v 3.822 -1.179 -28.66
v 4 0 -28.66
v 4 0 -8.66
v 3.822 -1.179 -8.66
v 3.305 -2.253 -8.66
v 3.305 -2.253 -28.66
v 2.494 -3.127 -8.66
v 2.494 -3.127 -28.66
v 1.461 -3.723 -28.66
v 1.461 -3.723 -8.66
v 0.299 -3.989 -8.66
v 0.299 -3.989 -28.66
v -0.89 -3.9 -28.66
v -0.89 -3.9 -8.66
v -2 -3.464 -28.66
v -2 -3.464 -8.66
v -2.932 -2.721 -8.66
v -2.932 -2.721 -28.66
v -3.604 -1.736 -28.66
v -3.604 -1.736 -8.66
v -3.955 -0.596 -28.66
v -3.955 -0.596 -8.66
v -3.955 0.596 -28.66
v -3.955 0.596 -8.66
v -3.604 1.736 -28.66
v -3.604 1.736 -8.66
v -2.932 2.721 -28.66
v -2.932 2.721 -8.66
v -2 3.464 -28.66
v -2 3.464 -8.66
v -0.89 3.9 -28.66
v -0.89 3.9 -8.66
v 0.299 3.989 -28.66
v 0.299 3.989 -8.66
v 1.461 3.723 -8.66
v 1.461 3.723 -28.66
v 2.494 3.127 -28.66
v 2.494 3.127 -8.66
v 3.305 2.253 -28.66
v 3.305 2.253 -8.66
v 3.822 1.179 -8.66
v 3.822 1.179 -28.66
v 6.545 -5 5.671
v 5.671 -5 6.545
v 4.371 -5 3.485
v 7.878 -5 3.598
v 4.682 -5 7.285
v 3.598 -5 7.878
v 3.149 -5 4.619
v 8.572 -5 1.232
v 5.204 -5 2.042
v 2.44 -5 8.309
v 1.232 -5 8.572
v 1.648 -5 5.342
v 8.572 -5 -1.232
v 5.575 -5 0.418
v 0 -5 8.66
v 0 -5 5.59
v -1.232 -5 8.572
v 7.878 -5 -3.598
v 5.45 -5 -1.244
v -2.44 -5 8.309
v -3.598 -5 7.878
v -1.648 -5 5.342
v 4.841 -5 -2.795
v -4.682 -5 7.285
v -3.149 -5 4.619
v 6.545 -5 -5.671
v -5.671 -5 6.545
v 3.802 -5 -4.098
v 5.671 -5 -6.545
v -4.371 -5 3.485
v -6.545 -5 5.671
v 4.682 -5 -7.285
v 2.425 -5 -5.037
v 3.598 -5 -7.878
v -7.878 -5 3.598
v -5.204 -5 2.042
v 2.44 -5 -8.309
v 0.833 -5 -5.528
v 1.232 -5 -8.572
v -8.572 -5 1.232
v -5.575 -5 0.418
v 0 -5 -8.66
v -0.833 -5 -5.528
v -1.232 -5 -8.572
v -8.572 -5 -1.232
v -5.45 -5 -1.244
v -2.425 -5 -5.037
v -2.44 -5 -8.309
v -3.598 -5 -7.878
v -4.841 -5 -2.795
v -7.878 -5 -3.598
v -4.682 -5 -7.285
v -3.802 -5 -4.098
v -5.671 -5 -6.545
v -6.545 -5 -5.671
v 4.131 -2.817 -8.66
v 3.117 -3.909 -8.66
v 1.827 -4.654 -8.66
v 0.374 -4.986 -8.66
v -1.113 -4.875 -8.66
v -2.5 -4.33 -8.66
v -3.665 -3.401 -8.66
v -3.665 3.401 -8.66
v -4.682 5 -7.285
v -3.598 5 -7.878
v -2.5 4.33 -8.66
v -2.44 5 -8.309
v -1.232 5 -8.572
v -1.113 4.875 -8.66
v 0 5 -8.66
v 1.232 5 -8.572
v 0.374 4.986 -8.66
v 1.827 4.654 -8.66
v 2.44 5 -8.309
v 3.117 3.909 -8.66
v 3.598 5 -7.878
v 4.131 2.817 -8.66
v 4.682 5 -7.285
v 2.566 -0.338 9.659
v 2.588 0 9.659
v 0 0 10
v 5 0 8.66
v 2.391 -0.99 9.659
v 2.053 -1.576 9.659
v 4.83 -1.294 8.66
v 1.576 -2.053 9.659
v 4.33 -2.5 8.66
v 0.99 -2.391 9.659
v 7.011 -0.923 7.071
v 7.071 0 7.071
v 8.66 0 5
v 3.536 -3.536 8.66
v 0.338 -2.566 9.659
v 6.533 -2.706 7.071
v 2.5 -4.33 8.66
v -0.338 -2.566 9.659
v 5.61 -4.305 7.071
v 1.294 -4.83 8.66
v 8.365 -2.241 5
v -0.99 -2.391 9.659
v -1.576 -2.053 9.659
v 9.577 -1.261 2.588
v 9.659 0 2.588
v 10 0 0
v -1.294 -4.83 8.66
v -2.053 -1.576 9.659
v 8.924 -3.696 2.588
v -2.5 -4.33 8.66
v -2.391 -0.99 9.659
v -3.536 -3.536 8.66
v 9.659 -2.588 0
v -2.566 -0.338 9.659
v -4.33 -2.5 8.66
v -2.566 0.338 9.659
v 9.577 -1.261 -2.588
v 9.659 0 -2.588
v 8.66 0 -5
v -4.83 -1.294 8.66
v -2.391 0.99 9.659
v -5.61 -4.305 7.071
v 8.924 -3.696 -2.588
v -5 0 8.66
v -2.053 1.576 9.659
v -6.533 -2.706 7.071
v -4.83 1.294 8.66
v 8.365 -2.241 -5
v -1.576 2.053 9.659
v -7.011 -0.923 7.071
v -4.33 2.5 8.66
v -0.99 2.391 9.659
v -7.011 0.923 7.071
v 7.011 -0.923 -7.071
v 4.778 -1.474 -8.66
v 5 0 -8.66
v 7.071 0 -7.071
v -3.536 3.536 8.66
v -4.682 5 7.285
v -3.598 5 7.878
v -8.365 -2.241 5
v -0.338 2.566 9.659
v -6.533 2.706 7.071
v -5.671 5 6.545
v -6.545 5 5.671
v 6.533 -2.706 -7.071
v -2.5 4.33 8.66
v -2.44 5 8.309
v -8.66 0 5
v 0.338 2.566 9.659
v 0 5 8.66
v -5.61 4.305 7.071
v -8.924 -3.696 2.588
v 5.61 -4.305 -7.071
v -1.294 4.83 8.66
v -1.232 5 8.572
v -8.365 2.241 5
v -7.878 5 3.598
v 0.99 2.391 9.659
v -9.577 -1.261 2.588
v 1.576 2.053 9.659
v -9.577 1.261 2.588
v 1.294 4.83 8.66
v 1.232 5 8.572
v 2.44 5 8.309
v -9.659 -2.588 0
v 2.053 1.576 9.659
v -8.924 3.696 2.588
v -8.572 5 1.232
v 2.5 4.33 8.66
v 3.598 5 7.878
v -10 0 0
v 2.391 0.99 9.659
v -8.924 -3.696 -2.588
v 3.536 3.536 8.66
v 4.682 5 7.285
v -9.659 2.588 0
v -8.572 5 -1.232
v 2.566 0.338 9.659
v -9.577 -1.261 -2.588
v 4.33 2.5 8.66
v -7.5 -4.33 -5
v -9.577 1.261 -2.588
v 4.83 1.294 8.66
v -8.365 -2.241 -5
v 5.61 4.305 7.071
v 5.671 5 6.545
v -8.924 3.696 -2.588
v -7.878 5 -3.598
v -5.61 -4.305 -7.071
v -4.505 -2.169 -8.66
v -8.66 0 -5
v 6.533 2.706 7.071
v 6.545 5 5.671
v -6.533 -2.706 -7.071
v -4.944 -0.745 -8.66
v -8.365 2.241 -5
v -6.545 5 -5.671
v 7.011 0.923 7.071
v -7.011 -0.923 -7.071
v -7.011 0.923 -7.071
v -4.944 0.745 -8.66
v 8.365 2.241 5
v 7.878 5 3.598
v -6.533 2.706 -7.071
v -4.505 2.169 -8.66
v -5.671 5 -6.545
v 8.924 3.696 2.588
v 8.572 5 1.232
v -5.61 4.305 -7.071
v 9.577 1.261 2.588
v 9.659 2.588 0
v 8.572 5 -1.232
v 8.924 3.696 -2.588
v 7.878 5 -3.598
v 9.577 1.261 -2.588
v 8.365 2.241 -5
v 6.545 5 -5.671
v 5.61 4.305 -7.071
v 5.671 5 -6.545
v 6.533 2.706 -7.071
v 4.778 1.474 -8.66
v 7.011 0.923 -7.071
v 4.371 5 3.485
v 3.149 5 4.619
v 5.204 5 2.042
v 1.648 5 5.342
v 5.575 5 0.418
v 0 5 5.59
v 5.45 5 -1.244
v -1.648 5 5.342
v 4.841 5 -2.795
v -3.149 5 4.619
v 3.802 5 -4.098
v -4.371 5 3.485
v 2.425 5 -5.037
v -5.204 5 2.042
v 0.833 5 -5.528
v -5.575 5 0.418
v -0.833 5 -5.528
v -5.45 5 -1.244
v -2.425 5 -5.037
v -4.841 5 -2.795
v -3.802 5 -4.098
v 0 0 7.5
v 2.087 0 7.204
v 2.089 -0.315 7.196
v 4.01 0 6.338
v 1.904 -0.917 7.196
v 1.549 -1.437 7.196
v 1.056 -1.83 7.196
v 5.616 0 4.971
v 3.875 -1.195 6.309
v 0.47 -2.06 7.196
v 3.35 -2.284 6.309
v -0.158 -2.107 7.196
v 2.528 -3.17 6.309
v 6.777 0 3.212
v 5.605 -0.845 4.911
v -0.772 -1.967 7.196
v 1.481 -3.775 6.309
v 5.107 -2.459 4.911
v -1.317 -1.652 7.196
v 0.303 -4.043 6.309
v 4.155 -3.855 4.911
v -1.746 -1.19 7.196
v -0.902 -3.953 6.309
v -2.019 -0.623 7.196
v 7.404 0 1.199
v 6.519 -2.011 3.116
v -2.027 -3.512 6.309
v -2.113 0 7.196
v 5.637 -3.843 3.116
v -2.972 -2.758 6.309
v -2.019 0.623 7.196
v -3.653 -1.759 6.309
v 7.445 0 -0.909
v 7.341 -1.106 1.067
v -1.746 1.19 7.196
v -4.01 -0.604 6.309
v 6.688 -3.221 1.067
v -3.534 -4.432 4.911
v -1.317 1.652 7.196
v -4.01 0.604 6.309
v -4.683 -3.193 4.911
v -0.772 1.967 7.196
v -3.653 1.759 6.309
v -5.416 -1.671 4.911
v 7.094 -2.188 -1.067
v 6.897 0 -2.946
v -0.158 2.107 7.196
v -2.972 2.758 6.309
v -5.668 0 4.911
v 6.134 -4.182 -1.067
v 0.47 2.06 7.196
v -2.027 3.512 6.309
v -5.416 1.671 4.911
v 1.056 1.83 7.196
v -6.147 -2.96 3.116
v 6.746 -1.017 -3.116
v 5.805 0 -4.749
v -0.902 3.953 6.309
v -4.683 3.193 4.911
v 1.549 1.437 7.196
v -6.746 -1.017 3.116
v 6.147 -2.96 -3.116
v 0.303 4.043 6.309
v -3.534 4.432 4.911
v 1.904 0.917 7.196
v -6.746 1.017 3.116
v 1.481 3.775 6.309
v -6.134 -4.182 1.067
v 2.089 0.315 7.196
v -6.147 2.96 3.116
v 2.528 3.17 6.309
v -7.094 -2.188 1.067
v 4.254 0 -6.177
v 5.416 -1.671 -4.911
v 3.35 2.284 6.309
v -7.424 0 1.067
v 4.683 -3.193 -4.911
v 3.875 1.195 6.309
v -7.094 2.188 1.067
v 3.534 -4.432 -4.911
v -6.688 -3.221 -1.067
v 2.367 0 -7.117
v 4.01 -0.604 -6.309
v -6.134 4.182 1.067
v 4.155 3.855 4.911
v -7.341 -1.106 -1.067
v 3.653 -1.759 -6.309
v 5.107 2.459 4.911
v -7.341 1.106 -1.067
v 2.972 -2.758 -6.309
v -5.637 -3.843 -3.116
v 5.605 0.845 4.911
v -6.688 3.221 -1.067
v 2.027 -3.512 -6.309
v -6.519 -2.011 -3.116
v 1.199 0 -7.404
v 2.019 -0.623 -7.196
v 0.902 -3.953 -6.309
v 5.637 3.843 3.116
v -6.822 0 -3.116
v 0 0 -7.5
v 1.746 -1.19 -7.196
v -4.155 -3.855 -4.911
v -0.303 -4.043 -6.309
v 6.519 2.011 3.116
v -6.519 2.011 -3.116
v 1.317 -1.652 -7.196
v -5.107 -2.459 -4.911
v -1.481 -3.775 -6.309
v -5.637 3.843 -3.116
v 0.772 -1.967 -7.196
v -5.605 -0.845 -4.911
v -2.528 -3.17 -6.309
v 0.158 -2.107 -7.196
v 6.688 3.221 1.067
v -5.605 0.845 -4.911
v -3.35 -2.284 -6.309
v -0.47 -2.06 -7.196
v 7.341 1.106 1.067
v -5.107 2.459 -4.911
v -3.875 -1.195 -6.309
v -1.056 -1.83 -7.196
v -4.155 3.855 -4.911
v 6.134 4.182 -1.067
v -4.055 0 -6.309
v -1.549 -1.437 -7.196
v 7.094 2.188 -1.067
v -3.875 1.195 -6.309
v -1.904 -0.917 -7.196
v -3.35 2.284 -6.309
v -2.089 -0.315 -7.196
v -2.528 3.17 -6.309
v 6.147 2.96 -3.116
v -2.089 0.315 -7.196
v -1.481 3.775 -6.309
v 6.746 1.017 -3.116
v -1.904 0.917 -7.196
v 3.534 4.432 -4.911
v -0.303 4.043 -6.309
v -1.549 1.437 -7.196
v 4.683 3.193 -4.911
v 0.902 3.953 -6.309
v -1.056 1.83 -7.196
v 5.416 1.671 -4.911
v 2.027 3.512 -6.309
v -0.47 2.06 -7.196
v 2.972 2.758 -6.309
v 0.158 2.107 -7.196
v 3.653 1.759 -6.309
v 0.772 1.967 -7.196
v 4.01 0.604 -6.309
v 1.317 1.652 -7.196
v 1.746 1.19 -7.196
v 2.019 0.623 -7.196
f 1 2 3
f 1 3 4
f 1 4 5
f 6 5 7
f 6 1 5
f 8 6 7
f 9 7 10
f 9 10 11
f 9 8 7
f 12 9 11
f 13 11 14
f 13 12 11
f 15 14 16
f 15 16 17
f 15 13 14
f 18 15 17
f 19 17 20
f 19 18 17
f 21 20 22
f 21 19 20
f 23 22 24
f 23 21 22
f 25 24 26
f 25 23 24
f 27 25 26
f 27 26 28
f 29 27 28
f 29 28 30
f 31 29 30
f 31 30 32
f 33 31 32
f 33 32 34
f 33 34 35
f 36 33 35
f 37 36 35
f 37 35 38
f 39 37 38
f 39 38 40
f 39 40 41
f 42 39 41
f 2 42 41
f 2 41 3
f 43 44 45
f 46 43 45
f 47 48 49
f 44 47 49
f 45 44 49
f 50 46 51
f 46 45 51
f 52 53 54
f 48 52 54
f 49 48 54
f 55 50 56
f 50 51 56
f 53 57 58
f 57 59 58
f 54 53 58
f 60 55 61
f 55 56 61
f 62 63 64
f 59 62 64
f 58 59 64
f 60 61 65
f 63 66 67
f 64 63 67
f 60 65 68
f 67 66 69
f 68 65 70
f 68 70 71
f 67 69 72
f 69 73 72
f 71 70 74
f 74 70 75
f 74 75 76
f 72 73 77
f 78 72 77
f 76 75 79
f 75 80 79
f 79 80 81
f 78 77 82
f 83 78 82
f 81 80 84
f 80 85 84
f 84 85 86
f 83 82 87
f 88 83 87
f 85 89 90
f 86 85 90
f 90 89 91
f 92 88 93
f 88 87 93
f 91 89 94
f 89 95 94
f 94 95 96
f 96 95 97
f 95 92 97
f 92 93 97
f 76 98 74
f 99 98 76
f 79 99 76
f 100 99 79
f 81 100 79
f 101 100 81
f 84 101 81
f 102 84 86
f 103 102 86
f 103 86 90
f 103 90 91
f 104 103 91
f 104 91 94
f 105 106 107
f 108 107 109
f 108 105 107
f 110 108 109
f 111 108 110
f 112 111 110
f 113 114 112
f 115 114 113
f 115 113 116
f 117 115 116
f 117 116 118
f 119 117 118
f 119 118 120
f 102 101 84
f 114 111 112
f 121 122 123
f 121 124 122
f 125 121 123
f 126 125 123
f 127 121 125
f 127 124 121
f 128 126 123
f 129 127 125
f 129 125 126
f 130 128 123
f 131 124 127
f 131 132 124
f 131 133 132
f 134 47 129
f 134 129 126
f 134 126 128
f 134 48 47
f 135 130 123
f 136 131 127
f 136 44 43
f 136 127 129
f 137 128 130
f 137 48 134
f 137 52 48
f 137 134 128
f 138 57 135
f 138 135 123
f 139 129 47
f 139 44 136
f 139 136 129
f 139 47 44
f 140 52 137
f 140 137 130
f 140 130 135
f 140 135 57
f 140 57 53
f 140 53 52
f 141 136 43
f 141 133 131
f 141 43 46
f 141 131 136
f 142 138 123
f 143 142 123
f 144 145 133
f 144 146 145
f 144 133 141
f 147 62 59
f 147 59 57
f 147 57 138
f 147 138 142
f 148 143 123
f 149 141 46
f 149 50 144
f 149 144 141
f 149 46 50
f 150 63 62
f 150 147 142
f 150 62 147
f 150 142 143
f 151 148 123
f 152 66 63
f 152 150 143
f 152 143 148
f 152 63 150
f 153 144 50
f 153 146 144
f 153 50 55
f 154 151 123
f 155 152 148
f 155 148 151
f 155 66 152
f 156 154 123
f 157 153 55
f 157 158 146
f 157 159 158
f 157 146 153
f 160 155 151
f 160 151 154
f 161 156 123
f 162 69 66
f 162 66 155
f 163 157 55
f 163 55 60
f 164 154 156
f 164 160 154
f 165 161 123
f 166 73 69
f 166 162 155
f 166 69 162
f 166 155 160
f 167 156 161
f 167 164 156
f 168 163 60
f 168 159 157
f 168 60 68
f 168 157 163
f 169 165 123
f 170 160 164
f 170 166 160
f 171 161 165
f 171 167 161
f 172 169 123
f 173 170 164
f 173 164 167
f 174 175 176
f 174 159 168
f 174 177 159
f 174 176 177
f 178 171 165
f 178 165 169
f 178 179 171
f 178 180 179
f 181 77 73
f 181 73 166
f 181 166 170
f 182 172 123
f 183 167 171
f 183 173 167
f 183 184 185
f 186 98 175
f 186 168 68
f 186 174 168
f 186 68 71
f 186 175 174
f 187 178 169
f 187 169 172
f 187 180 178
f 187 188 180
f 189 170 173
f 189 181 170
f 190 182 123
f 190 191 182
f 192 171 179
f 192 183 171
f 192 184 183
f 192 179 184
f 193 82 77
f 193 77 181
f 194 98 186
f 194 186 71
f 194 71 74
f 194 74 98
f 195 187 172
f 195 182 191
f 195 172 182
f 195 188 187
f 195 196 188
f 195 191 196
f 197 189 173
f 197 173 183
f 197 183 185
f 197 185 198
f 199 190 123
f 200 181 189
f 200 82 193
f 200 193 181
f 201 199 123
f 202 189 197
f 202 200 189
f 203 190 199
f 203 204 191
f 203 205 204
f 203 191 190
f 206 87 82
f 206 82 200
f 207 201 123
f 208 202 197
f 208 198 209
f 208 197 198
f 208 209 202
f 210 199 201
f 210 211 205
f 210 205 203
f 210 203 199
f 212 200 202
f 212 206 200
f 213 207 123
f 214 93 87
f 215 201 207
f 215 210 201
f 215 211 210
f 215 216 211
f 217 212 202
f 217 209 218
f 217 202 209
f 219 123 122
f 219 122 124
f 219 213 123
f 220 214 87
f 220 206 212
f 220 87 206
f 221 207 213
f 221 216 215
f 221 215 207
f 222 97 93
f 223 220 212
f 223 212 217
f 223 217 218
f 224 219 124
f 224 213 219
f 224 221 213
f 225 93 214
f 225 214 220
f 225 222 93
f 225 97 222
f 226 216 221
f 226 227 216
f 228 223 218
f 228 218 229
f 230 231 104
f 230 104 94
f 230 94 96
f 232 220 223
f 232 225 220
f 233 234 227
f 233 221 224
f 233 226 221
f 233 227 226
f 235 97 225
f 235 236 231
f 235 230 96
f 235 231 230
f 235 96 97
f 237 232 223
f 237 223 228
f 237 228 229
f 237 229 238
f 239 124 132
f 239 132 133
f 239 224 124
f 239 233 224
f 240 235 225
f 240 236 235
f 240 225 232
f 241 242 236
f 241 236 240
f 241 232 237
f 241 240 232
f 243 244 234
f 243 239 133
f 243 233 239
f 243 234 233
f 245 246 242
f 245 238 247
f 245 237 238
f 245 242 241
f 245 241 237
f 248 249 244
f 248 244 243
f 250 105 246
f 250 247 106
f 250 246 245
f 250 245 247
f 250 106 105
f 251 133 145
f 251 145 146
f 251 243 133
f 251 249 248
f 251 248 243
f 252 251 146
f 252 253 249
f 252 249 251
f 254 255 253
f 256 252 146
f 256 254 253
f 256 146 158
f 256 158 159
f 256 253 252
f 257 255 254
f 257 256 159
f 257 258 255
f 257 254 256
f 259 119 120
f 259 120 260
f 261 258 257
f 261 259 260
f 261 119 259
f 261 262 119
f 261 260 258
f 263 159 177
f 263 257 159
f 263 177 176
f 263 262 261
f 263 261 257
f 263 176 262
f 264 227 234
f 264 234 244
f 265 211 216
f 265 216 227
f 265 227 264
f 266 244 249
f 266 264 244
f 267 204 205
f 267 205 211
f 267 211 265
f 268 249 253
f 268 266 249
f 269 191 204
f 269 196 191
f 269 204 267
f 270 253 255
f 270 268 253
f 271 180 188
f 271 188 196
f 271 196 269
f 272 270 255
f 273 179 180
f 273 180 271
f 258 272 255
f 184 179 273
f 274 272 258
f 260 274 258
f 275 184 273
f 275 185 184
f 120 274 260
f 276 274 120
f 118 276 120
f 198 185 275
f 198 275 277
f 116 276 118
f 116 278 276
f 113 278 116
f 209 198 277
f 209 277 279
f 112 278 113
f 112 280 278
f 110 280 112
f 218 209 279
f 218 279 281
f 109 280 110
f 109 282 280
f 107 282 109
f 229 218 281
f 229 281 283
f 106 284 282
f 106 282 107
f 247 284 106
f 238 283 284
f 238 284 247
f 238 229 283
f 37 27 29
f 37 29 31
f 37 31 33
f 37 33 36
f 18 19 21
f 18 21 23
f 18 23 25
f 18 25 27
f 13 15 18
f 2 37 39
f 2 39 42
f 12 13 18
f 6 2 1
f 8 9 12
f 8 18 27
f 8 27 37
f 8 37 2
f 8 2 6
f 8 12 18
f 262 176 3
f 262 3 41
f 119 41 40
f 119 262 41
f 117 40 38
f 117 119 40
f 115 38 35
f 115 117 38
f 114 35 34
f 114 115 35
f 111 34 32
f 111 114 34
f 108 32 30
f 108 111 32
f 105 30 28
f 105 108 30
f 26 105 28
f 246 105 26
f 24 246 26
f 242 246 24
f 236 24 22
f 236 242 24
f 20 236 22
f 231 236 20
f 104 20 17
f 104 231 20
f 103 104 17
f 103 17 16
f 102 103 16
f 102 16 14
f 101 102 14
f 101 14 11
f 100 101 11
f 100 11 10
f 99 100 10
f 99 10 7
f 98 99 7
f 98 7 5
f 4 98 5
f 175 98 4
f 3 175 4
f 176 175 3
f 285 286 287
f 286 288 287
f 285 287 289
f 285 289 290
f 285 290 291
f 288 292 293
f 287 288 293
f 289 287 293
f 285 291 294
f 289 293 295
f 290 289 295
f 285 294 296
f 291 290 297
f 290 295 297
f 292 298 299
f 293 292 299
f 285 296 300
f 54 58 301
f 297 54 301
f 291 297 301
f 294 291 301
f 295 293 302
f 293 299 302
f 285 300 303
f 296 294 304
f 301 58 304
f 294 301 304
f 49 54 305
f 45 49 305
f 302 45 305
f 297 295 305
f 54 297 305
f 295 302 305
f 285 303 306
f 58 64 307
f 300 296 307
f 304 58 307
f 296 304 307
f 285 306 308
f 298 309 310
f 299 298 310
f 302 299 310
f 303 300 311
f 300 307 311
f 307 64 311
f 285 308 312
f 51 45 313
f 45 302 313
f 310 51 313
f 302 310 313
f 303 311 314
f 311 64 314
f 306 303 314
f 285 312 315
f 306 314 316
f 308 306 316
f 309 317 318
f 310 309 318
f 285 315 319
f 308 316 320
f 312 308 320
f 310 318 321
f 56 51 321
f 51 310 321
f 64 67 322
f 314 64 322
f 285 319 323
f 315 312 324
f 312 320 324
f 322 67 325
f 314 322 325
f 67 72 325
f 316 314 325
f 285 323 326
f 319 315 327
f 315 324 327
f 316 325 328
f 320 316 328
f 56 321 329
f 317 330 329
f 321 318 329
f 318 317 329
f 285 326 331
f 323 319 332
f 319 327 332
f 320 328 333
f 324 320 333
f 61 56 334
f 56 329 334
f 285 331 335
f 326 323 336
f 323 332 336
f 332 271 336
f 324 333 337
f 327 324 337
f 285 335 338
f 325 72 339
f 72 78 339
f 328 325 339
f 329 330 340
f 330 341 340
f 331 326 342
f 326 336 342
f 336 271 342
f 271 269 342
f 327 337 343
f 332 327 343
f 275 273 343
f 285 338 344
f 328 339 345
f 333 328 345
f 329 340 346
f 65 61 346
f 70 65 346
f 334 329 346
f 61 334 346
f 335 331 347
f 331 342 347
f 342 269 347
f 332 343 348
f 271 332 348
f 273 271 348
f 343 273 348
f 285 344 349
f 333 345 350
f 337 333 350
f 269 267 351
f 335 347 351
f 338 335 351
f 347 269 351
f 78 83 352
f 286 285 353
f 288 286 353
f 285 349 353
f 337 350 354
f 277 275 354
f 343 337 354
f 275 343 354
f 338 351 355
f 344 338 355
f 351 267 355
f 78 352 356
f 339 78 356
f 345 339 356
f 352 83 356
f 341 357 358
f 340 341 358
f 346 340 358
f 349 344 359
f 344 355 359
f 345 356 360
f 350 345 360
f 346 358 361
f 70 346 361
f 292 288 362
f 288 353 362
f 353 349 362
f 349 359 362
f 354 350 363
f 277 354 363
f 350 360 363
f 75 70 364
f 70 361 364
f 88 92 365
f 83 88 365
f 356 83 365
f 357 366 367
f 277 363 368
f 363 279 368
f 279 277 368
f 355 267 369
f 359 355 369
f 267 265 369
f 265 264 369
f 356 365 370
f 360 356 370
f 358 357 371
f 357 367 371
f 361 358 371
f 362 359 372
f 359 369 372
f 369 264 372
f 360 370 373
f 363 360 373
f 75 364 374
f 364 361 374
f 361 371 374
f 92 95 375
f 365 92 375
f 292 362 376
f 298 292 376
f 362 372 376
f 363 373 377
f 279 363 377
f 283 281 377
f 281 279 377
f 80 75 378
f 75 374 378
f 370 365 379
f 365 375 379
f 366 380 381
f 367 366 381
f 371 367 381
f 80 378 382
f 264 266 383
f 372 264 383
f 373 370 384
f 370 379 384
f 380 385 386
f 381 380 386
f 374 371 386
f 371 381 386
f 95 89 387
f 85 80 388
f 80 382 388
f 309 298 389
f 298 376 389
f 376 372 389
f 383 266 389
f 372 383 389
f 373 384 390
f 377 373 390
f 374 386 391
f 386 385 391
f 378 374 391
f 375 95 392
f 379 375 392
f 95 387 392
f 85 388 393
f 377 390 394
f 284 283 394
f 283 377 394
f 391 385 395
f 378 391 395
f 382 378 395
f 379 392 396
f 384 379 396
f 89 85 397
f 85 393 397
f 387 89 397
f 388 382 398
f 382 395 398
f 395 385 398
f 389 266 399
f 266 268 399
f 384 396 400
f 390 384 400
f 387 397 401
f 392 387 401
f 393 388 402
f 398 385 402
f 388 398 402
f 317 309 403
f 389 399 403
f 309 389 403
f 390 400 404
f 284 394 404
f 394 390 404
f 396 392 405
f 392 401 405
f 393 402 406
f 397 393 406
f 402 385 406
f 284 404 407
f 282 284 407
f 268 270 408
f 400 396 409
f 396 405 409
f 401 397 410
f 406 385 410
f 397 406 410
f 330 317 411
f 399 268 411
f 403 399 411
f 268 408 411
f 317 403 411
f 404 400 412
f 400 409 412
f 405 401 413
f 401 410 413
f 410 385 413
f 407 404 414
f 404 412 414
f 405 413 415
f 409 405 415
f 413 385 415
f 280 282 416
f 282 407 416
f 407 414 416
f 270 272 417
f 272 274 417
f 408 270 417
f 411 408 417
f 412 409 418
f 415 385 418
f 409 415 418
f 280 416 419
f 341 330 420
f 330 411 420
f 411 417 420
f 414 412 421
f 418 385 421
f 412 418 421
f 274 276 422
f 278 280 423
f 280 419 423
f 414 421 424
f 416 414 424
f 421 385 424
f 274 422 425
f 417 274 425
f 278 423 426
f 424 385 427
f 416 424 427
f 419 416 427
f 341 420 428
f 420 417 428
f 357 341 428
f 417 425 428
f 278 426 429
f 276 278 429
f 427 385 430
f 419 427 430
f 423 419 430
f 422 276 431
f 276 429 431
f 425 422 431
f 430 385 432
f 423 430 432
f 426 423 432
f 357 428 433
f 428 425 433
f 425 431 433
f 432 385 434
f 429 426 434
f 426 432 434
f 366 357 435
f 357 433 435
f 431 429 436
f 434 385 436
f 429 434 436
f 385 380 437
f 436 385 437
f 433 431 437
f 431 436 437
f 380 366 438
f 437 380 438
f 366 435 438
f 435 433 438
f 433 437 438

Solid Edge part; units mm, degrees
sketch "Sketch1" plane through (0, 0, 0) normal (0, -1, 0) x (1, 0, 0)
  arc A0 (0, 10) -> (5, -8.6603) centre (0, 0) cw
  line L0 (5, -8.6603) -> (4, -8.6603)
  line L1 (4, -8.6603) -> (4, -28.6603)
  line L2 (4, -28.6603) -> (0, -28.6603)
  dimension "D1" = 10
  dimension "D2" = 1
  dimension "D3" = 4
  dimension "D4" = 20
revolve "RevolvedProtrusion1" add sketch "Sketch1" angle 360 about axis through (0, 0, 10) along (0, 0, -1)
sketch "Sketch2" plane through (0, 0, 0) normal (1, 0, 0) x (0, 1, 0)
  line L0 (5, -8.6603) -> (11.9647, -8.6603)
  line L1 (11.9647, -8.6603) -> (11.9647, 12.055)
  line L2 (11.9647, 12.055) -> (5, 12.055)
  line L3 (5, 12.055) -> (5, -8.6603)
  line L4 (-5, -8.6603) -> (-11.8811, -8.6603)
  line L5 (-11.8811, -8.6603) -> (-11.8811, 12.3755)
  line L6 (-11.8811, 12.3755) -> (-5, 12.3755)
  line L7 (-5, 12.3755) -> (-5, -8.6603)
  dimension "D1" = 5
  dimension "D2" = 5
extrude "Cutout1" cut sketch "Sketch2" along normal mid plane 26.6508
sketch "Sketch3" plane through (0, 0, 0) normal (0, -1, 0) x (1, 0, 0)
  arc A0 (0, 7.5) -> (0, -7.5) centre (0, 0) cw
  dimension "D1" = 7.5
revolve "RevolvedCutout1" cut sketch "Sketch3" angle 360 about axis through (0, 0, 6) along (0, 0, -1)
cosmetic_thread "Thread1" size "M8"
properties material "Steel"
